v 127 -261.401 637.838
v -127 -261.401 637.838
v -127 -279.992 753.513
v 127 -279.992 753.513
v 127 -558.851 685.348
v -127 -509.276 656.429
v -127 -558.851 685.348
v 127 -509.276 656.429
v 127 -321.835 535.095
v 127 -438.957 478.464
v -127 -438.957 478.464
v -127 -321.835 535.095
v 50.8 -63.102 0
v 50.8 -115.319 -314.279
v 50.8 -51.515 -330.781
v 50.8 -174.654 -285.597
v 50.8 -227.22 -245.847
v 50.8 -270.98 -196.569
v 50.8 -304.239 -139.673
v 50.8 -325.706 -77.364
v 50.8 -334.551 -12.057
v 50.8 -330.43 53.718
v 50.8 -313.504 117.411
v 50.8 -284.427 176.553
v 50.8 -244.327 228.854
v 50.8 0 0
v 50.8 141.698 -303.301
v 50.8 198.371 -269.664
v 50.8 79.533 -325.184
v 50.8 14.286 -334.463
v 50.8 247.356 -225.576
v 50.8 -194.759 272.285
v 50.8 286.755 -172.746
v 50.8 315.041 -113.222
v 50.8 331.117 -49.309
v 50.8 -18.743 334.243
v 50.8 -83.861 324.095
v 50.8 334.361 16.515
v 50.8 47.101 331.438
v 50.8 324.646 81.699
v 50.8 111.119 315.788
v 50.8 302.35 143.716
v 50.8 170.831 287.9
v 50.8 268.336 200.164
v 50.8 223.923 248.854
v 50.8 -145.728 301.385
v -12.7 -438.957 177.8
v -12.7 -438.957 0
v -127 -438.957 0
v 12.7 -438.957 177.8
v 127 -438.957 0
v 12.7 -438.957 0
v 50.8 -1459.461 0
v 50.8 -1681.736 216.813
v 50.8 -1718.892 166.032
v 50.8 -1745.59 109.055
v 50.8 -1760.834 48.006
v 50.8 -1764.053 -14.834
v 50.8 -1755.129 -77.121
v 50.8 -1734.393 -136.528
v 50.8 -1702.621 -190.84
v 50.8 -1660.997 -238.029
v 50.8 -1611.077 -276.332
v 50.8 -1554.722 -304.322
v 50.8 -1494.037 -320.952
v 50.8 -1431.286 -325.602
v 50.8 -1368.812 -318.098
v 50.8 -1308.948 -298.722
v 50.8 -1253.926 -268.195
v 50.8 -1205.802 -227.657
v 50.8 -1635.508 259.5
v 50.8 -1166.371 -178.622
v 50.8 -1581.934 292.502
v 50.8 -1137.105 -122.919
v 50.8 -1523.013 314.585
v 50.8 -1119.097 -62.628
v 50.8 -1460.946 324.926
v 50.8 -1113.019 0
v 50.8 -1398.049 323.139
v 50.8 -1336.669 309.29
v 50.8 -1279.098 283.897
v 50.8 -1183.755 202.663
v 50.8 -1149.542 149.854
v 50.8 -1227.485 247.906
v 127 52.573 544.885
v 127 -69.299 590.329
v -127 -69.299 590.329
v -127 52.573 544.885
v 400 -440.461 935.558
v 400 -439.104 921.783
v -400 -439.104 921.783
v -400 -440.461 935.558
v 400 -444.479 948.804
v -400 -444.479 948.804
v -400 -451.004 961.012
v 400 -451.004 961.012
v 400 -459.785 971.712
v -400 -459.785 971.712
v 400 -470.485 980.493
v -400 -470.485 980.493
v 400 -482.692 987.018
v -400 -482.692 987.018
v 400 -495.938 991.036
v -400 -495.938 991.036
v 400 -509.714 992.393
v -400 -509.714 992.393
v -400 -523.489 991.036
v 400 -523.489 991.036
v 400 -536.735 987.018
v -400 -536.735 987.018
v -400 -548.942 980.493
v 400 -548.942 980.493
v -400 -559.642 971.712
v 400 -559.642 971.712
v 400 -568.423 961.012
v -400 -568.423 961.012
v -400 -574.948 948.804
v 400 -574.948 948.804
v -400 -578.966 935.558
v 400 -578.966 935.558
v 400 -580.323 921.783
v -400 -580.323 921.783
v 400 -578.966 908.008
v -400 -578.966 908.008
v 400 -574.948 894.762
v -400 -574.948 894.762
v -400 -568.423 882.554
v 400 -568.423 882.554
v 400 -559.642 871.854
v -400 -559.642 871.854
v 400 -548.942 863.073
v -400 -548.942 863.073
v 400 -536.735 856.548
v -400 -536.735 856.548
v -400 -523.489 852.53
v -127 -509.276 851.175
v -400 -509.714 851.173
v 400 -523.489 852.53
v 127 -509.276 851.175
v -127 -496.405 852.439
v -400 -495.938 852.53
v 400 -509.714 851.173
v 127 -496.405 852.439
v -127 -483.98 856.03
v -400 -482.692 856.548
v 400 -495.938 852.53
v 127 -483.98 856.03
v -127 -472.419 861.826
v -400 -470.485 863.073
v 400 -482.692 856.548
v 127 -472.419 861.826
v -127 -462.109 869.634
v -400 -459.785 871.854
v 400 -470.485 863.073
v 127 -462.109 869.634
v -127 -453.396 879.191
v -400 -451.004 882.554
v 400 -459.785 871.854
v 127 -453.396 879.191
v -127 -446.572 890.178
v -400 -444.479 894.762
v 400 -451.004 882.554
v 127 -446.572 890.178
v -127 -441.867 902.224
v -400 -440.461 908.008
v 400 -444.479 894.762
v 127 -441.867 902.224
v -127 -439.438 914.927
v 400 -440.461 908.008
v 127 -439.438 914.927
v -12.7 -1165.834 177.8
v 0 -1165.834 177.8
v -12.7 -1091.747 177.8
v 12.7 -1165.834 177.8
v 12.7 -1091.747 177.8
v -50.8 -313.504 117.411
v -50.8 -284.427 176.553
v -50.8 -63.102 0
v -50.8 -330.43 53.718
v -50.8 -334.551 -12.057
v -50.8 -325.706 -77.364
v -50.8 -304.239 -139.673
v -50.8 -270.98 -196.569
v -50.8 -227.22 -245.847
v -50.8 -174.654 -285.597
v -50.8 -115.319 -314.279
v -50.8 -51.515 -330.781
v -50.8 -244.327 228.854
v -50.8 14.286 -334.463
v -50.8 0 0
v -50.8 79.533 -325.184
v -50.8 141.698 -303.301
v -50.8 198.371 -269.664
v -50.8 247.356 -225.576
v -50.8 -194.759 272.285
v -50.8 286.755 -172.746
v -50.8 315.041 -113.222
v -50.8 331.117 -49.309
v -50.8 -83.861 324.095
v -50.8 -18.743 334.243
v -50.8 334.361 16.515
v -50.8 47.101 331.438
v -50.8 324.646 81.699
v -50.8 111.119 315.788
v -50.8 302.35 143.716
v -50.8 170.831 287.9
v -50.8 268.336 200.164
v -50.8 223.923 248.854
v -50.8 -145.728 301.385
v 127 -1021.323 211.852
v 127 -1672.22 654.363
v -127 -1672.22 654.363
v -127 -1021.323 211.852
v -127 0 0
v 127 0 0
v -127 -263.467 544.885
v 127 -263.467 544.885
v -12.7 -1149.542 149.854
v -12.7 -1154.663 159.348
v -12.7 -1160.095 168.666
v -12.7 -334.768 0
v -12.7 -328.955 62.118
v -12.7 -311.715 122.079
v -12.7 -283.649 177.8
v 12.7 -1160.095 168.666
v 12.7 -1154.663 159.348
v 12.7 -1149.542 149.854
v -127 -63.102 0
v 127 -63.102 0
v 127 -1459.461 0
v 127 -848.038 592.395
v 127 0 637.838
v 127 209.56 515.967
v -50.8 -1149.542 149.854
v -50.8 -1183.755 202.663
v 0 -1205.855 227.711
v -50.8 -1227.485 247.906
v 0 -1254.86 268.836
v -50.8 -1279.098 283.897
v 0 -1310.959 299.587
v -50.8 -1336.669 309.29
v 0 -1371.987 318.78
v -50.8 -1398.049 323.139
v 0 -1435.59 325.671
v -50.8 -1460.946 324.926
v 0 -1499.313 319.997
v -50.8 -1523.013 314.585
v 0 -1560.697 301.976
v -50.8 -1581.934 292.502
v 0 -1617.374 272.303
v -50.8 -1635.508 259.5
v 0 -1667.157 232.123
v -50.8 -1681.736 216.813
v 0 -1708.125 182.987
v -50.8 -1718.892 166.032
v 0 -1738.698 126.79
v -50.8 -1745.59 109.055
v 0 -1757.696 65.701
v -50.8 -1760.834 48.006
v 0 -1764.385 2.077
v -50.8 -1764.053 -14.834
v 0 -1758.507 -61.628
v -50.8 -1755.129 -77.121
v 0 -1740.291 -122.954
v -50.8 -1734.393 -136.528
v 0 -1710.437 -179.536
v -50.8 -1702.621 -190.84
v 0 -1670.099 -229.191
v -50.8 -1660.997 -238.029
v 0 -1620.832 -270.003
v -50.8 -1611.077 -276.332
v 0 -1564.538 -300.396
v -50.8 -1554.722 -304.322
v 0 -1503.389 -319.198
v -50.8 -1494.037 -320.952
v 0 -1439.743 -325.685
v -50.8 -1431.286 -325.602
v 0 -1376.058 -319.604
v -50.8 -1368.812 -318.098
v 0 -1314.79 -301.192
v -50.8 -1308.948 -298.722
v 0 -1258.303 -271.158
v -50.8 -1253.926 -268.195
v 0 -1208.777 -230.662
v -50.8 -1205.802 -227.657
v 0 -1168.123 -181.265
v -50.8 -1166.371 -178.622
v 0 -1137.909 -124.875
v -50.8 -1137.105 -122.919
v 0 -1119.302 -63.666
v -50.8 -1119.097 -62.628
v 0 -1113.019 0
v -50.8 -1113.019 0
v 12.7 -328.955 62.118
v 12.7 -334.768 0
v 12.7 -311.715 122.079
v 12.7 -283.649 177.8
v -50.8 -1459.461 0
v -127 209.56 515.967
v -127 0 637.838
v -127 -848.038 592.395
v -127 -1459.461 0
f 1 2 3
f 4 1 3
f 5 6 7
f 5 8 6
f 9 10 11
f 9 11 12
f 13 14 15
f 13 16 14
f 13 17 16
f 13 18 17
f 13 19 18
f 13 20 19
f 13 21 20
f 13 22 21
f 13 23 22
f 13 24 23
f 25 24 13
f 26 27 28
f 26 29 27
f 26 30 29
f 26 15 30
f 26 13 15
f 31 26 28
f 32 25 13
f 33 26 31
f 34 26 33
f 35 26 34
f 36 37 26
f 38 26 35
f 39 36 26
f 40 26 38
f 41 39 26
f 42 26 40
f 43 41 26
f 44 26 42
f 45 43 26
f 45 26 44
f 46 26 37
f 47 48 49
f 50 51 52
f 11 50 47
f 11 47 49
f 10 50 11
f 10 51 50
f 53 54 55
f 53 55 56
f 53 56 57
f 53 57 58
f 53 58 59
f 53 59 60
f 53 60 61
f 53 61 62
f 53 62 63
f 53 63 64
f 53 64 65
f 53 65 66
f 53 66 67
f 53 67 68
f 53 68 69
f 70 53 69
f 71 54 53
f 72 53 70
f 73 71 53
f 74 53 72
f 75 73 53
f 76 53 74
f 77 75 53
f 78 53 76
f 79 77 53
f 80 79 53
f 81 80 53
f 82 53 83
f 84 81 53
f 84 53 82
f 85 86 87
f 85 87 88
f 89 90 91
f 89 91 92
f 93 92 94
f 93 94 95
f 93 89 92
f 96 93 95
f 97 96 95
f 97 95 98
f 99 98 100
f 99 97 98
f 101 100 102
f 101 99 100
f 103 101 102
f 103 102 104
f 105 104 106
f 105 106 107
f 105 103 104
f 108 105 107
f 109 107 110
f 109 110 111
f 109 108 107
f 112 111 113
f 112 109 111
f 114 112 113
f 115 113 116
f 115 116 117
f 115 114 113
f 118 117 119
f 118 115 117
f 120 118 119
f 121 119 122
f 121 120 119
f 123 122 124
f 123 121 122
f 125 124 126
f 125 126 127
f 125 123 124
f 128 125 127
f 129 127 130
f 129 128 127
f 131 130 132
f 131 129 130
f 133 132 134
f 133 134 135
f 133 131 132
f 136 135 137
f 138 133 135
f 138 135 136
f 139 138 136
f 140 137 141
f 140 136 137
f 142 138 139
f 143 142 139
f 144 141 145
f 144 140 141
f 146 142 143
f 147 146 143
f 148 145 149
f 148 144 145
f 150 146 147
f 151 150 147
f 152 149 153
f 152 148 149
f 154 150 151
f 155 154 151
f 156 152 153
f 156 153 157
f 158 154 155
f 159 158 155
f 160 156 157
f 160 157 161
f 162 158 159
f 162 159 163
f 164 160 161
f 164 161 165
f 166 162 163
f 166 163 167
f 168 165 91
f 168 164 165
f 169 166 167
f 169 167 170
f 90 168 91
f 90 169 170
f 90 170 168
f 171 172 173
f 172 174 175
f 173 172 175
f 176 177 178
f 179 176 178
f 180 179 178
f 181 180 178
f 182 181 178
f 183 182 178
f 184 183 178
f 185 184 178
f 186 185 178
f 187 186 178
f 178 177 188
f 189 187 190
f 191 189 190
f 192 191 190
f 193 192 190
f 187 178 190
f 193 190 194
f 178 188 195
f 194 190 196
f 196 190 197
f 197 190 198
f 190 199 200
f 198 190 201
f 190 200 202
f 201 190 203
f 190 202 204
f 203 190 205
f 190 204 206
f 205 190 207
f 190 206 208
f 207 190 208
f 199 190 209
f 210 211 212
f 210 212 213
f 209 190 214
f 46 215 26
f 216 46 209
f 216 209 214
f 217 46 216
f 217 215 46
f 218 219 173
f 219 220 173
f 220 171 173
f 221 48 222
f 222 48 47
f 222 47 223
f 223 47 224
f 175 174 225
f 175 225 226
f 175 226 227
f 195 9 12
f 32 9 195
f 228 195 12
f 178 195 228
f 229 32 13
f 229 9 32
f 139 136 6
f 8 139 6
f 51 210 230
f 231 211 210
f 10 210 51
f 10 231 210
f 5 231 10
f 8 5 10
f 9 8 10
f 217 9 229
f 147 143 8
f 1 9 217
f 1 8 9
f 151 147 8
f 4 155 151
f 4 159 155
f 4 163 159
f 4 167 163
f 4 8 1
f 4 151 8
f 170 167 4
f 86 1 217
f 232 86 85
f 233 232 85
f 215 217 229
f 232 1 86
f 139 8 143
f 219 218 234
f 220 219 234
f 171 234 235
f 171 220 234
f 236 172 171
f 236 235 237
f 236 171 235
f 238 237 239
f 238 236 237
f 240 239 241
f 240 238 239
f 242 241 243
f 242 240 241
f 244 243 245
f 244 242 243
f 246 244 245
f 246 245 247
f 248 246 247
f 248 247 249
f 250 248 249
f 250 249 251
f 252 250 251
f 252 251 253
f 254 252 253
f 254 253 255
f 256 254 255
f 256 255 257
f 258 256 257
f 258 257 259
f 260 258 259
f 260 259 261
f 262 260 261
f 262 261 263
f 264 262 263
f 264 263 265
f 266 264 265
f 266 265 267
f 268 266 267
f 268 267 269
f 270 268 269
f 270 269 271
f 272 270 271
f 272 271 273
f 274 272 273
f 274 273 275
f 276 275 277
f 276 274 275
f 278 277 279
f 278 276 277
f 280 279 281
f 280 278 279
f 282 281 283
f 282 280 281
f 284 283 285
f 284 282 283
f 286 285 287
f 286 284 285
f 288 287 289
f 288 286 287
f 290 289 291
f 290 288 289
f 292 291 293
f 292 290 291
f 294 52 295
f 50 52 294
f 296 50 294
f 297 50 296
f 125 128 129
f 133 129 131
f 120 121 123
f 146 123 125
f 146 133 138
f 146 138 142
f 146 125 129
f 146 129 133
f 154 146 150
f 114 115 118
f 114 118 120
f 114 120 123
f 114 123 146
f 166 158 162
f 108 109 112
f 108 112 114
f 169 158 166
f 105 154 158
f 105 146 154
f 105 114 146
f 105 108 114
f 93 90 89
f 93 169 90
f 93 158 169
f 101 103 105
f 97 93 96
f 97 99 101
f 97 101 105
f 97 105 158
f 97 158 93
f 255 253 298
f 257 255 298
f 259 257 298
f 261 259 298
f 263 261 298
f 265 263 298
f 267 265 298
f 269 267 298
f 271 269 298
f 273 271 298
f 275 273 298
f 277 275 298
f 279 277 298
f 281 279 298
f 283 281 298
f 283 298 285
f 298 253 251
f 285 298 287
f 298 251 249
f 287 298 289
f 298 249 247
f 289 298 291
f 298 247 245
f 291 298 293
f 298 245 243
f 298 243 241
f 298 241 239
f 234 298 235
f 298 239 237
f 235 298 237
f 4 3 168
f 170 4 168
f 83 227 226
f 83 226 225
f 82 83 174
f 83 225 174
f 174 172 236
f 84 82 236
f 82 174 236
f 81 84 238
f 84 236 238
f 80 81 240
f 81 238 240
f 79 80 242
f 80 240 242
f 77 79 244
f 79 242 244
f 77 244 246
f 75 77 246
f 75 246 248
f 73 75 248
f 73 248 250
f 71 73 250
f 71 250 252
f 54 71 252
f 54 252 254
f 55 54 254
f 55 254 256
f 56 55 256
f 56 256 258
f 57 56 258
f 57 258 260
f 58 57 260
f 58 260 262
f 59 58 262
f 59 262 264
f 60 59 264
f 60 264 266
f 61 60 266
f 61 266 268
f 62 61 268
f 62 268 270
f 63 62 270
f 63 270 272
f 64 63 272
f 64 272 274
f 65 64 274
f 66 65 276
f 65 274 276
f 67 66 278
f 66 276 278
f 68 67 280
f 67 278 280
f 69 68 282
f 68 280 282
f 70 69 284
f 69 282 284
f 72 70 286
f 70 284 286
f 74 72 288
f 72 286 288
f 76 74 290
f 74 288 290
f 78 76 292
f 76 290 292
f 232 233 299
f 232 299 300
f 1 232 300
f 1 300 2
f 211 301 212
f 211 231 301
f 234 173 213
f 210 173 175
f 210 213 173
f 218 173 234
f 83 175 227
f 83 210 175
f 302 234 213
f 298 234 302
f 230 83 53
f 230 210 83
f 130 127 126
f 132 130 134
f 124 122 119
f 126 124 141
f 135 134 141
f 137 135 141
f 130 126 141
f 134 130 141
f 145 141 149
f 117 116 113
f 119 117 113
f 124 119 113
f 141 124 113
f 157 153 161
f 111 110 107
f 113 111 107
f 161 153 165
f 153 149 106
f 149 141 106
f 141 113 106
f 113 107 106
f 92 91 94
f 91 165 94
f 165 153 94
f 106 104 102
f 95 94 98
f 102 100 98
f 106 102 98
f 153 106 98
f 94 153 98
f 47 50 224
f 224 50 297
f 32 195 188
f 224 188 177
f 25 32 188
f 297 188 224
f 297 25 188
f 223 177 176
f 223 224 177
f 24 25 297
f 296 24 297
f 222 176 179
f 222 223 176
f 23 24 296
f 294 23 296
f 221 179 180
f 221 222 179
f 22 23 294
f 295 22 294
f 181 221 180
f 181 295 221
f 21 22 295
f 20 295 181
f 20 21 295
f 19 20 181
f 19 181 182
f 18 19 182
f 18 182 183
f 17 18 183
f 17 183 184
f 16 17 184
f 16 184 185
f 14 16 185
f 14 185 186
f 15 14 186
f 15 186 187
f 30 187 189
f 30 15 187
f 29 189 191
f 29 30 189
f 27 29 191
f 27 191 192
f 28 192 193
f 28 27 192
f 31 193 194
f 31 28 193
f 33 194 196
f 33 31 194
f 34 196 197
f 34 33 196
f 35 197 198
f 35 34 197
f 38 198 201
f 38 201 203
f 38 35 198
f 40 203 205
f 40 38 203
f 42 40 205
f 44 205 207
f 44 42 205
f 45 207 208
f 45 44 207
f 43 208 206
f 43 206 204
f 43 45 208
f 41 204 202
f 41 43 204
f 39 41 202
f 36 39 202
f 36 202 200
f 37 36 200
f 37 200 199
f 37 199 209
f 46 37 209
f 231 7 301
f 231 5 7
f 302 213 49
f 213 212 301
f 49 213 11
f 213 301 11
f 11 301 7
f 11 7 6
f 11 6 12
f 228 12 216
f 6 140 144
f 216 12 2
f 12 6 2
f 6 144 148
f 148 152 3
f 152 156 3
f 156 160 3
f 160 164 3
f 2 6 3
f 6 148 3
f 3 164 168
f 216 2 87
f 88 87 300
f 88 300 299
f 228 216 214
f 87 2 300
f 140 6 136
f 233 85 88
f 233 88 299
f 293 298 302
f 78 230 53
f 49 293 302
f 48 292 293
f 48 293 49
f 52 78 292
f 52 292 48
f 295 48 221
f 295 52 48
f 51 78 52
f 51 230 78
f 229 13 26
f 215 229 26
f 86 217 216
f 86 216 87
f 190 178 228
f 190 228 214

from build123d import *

# Parameters (mm, degrees)
F0_R      = 266.7
F1_DEPTH  = 38.1
F0_R_2    = 228.6
F2_DEPTH  = 50.8
F3_W      = 1447.8
F3_H      = 177.8
F4_DEPTH  = 12.7
F6_DEPTH  = 127
F7_R      = 325.686391
F7_R_2    = 334.768368
F8_DEPTH  = 50.8
F9_R      = 70.609631
F10_DEPTH = 400


with BuildPart() as f1:
    # F0 (on Right) → F1 (new body, symmetric)
    with BuildSketch(Plane.YZ):
        Circle(F0_R)
    extrude(amount=F1_DEPTH, both=True)



with BuildPart() as f2:
    # F0 (on Right) → F2 (new body, symmetric)
    with BuildSketch(Plane.YZ):
        with Locations((-1447.8, 0)):
            Circle(F0_R_2)
    extrude(amount=F2_DEPTH, both=True)


with BuildPart() as f1_1:
    add(f1.part)

    add(f2.part)  # F4 merges F2
    # F3 (on Right) → F4 (join, symmetric)
    with BuildSketch(Plane.YZ):
        with Locations((-723.9, 88.9)):
            Rectangle(F3_W, F3_H)
    extrude(amount=F4_DEPTH, both=True)

    # F5 (on Right) → F6 (join, symmetric)
    with BuildSketch(Plane.YZ):
        Polygon((-848.037601, 592.394769), (-1672.220111, 654.363334), (-1021.323022, 211.851792), (-1459.461212, 0), (-1219.849229, 0), (-438.957124, 0), (-438.957124, 478.463715), (-321.835073, 535.095428), (-63.101806, 0), (0, 0), (-263.467014, 544.885457), (-69.298647, 590.329111), (52.57291, 544.885457), (209.560111, 515.966773), (0, 637.838423), (-261.401385, 637.838423), (-279.991955, 753.513157), (-447.307229, 922.894001), (-509.275854, 922.894001), (-509.275854, 656.428993), (-558.850706, 685.347676), align=None)
    extrude(amount=F6_DEPTH, both=True)

    # F7 (on Right) → F8 (join, symmetric)
    with BuildSketch(Plane.YZ):
        with Locations((-1438.704967, 0)):
            Circle(F7_R)
        Circle(F7_R_2)
    extrude(amount=F8_DEPTH, both=True)

    # F9 (on Right) → F10 (join, symmetric)
    with BuildSketch(Plane.YZ):
        with Locations((-509.713531, 921.78303)):
            Circle(F9_R)
    extrude(amount=F10_DEPTH, both=True)


solid = f1_1.part
